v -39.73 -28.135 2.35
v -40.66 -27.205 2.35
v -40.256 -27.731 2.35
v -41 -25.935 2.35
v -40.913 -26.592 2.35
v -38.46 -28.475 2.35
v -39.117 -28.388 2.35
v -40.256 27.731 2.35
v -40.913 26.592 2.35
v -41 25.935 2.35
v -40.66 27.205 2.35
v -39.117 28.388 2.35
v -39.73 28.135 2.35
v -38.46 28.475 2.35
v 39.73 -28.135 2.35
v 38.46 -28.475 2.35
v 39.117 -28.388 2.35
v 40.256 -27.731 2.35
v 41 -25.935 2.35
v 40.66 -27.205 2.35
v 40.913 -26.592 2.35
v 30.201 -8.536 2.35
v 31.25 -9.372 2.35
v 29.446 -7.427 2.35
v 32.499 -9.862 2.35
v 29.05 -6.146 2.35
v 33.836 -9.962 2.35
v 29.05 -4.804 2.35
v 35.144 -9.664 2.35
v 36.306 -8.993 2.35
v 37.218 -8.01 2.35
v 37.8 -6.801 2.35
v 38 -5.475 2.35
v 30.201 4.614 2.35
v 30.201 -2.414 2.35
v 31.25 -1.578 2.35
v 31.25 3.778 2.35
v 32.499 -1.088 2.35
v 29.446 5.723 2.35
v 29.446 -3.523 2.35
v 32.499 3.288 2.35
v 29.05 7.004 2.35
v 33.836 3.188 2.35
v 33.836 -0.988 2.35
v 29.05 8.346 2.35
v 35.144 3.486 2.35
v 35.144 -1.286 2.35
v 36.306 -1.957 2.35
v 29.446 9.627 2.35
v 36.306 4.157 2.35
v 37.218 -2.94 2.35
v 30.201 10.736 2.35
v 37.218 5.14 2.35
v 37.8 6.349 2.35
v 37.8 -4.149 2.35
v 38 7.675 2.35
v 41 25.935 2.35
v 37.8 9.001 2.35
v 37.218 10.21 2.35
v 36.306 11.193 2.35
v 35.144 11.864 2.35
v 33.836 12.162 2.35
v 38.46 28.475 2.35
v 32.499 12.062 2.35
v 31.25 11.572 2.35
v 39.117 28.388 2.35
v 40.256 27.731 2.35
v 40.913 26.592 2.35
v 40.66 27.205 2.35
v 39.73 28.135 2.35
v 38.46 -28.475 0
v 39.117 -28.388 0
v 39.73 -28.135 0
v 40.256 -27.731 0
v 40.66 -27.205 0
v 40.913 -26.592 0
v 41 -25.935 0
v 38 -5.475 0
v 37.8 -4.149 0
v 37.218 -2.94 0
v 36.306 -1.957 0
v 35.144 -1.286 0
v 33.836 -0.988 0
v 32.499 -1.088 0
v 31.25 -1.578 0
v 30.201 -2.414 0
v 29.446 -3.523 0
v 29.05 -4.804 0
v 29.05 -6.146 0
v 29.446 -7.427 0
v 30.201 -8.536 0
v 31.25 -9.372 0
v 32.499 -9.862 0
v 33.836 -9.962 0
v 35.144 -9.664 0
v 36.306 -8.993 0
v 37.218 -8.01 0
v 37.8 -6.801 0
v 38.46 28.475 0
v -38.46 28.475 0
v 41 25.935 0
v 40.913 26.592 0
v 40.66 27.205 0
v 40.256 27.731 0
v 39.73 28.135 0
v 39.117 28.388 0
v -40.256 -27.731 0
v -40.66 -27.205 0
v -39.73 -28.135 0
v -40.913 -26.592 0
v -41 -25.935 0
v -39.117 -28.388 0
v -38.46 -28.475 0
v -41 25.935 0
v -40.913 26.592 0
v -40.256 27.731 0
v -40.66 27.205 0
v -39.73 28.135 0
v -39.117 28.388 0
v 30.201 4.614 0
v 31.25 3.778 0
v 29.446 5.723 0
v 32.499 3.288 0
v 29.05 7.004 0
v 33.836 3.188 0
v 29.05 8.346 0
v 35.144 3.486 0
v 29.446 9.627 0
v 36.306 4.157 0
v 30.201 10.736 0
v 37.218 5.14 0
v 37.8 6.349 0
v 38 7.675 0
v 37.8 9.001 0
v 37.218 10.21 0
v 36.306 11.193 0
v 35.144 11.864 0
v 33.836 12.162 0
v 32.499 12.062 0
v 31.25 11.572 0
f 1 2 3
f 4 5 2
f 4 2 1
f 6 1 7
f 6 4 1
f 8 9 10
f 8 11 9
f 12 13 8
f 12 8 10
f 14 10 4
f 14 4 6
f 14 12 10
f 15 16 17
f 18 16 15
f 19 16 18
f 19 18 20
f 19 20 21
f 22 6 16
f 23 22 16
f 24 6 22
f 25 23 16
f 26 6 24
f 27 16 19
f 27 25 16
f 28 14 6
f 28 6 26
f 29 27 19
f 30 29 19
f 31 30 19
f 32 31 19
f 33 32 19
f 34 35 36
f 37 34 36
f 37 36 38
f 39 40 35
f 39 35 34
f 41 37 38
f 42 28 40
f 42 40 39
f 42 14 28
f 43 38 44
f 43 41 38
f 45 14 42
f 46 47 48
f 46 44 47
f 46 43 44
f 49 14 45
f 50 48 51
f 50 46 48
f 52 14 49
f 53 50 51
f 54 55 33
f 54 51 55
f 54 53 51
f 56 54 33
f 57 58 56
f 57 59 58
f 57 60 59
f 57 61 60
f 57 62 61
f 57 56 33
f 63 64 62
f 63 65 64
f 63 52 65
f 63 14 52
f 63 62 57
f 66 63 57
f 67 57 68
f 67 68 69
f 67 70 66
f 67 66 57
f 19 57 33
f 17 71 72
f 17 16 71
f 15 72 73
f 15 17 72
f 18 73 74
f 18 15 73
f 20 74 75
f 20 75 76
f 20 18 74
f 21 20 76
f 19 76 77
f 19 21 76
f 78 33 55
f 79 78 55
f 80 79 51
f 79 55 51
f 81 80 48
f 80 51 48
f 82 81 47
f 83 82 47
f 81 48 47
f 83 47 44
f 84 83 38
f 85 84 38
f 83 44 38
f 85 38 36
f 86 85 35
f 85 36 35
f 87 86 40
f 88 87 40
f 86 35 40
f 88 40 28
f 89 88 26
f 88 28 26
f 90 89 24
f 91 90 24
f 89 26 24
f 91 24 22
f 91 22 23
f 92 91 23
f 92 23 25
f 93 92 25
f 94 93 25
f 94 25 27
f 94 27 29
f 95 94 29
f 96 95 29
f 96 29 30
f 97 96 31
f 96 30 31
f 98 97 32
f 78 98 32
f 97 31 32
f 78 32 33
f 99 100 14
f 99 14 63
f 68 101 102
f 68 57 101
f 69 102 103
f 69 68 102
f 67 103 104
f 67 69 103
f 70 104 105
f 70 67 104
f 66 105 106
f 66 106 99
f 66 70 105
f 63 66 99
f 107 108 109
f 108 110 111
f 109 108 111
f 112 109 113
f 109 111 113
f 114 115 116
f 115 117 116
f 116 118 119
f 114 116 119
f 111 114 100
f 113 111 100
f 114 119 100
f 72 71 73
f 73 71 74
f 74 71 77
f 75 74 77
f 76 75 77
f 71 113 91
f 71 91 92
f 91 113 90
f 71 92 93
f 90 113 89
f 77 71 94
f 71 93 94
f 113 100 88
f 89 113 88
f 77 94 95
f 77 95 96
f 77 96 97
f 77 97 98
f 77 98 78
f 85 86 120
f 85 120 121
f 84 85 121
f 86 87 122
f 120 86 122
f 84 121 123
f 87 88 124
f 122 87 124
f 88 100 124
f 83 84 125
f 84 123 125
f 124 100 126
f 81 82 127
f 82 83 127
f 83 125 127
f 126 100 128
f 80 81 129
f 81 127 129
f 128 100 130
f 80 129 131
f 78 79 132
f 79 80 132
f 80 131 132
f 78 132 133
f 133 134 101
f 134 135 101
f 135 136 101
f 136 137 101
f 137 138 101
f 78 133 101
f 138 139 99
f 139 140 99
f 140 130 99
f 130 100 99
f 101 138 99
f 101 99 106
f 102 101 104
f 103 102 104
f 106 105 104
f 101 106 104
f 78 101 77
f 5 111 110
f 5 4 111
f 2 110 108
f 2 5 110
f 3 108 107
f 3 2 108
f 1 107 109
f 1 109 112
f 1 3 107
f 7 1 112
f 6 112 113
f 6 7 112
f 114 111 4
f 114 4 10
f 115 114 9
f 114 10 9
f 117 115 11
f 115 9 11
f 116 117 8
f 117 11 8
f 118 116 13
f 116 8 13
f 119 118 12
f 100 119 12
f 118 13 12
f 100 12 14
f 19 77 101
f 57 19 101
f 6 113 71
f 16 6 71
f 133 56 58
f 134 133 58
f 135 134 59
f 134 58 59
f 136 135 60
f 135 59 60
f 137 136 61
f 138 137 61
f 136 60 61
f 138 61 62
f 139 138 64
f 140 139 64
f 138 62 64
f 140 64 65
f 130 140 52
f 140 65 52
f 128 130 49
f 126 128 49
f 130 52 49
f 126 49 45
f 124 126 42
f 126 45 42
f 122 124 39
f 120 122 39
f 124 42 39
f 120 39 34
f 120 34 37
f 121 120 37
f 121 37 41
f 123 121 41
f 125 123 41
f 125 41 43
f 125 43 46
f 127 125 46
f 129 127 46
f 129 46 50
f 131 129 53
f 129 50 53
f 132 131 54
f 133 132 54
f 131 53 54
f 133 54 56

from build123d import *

# Parameters (mm, degrees)
F0_W     = 82
F0_H     = 56.95
F1_DEPTH = 2.35
F2_R     = 2.54
F3_R     = 4.5
F4_DEPTH = 2.35


with BuildPart() as f1:
    # F0 (on Top) → F1 (new body)
    with BuildSketch(Plane.XY):
        Rectangle(F0_W, F0_H)
    extrude(amount=F1_DEPTH)

    # F2
    f2_edges = [f1.edges().sort_by_distance(p)[0] for p in [
        (-41, 28.475, 1.175),
        (-41, -28.475, 1.175),
        (41, 28.475, 1.175),
        (41, -28.475, 1.175),
    ]]
    fillet(f2_edges, radius=F2_R)

    # F3 (on face) → F4 (cut, through all)
    with BuildSketch(Plane.XY.offset(2.35)):
        with Locations((33.5, 7.675)):
            Circle(F3_R)
        with Locations((33.5, -5.475)):
            Circle(F3_R)
    extrude(amount=-F4_DEPTH, mode=Mode.SUBTRACT)


solid = f1.part
